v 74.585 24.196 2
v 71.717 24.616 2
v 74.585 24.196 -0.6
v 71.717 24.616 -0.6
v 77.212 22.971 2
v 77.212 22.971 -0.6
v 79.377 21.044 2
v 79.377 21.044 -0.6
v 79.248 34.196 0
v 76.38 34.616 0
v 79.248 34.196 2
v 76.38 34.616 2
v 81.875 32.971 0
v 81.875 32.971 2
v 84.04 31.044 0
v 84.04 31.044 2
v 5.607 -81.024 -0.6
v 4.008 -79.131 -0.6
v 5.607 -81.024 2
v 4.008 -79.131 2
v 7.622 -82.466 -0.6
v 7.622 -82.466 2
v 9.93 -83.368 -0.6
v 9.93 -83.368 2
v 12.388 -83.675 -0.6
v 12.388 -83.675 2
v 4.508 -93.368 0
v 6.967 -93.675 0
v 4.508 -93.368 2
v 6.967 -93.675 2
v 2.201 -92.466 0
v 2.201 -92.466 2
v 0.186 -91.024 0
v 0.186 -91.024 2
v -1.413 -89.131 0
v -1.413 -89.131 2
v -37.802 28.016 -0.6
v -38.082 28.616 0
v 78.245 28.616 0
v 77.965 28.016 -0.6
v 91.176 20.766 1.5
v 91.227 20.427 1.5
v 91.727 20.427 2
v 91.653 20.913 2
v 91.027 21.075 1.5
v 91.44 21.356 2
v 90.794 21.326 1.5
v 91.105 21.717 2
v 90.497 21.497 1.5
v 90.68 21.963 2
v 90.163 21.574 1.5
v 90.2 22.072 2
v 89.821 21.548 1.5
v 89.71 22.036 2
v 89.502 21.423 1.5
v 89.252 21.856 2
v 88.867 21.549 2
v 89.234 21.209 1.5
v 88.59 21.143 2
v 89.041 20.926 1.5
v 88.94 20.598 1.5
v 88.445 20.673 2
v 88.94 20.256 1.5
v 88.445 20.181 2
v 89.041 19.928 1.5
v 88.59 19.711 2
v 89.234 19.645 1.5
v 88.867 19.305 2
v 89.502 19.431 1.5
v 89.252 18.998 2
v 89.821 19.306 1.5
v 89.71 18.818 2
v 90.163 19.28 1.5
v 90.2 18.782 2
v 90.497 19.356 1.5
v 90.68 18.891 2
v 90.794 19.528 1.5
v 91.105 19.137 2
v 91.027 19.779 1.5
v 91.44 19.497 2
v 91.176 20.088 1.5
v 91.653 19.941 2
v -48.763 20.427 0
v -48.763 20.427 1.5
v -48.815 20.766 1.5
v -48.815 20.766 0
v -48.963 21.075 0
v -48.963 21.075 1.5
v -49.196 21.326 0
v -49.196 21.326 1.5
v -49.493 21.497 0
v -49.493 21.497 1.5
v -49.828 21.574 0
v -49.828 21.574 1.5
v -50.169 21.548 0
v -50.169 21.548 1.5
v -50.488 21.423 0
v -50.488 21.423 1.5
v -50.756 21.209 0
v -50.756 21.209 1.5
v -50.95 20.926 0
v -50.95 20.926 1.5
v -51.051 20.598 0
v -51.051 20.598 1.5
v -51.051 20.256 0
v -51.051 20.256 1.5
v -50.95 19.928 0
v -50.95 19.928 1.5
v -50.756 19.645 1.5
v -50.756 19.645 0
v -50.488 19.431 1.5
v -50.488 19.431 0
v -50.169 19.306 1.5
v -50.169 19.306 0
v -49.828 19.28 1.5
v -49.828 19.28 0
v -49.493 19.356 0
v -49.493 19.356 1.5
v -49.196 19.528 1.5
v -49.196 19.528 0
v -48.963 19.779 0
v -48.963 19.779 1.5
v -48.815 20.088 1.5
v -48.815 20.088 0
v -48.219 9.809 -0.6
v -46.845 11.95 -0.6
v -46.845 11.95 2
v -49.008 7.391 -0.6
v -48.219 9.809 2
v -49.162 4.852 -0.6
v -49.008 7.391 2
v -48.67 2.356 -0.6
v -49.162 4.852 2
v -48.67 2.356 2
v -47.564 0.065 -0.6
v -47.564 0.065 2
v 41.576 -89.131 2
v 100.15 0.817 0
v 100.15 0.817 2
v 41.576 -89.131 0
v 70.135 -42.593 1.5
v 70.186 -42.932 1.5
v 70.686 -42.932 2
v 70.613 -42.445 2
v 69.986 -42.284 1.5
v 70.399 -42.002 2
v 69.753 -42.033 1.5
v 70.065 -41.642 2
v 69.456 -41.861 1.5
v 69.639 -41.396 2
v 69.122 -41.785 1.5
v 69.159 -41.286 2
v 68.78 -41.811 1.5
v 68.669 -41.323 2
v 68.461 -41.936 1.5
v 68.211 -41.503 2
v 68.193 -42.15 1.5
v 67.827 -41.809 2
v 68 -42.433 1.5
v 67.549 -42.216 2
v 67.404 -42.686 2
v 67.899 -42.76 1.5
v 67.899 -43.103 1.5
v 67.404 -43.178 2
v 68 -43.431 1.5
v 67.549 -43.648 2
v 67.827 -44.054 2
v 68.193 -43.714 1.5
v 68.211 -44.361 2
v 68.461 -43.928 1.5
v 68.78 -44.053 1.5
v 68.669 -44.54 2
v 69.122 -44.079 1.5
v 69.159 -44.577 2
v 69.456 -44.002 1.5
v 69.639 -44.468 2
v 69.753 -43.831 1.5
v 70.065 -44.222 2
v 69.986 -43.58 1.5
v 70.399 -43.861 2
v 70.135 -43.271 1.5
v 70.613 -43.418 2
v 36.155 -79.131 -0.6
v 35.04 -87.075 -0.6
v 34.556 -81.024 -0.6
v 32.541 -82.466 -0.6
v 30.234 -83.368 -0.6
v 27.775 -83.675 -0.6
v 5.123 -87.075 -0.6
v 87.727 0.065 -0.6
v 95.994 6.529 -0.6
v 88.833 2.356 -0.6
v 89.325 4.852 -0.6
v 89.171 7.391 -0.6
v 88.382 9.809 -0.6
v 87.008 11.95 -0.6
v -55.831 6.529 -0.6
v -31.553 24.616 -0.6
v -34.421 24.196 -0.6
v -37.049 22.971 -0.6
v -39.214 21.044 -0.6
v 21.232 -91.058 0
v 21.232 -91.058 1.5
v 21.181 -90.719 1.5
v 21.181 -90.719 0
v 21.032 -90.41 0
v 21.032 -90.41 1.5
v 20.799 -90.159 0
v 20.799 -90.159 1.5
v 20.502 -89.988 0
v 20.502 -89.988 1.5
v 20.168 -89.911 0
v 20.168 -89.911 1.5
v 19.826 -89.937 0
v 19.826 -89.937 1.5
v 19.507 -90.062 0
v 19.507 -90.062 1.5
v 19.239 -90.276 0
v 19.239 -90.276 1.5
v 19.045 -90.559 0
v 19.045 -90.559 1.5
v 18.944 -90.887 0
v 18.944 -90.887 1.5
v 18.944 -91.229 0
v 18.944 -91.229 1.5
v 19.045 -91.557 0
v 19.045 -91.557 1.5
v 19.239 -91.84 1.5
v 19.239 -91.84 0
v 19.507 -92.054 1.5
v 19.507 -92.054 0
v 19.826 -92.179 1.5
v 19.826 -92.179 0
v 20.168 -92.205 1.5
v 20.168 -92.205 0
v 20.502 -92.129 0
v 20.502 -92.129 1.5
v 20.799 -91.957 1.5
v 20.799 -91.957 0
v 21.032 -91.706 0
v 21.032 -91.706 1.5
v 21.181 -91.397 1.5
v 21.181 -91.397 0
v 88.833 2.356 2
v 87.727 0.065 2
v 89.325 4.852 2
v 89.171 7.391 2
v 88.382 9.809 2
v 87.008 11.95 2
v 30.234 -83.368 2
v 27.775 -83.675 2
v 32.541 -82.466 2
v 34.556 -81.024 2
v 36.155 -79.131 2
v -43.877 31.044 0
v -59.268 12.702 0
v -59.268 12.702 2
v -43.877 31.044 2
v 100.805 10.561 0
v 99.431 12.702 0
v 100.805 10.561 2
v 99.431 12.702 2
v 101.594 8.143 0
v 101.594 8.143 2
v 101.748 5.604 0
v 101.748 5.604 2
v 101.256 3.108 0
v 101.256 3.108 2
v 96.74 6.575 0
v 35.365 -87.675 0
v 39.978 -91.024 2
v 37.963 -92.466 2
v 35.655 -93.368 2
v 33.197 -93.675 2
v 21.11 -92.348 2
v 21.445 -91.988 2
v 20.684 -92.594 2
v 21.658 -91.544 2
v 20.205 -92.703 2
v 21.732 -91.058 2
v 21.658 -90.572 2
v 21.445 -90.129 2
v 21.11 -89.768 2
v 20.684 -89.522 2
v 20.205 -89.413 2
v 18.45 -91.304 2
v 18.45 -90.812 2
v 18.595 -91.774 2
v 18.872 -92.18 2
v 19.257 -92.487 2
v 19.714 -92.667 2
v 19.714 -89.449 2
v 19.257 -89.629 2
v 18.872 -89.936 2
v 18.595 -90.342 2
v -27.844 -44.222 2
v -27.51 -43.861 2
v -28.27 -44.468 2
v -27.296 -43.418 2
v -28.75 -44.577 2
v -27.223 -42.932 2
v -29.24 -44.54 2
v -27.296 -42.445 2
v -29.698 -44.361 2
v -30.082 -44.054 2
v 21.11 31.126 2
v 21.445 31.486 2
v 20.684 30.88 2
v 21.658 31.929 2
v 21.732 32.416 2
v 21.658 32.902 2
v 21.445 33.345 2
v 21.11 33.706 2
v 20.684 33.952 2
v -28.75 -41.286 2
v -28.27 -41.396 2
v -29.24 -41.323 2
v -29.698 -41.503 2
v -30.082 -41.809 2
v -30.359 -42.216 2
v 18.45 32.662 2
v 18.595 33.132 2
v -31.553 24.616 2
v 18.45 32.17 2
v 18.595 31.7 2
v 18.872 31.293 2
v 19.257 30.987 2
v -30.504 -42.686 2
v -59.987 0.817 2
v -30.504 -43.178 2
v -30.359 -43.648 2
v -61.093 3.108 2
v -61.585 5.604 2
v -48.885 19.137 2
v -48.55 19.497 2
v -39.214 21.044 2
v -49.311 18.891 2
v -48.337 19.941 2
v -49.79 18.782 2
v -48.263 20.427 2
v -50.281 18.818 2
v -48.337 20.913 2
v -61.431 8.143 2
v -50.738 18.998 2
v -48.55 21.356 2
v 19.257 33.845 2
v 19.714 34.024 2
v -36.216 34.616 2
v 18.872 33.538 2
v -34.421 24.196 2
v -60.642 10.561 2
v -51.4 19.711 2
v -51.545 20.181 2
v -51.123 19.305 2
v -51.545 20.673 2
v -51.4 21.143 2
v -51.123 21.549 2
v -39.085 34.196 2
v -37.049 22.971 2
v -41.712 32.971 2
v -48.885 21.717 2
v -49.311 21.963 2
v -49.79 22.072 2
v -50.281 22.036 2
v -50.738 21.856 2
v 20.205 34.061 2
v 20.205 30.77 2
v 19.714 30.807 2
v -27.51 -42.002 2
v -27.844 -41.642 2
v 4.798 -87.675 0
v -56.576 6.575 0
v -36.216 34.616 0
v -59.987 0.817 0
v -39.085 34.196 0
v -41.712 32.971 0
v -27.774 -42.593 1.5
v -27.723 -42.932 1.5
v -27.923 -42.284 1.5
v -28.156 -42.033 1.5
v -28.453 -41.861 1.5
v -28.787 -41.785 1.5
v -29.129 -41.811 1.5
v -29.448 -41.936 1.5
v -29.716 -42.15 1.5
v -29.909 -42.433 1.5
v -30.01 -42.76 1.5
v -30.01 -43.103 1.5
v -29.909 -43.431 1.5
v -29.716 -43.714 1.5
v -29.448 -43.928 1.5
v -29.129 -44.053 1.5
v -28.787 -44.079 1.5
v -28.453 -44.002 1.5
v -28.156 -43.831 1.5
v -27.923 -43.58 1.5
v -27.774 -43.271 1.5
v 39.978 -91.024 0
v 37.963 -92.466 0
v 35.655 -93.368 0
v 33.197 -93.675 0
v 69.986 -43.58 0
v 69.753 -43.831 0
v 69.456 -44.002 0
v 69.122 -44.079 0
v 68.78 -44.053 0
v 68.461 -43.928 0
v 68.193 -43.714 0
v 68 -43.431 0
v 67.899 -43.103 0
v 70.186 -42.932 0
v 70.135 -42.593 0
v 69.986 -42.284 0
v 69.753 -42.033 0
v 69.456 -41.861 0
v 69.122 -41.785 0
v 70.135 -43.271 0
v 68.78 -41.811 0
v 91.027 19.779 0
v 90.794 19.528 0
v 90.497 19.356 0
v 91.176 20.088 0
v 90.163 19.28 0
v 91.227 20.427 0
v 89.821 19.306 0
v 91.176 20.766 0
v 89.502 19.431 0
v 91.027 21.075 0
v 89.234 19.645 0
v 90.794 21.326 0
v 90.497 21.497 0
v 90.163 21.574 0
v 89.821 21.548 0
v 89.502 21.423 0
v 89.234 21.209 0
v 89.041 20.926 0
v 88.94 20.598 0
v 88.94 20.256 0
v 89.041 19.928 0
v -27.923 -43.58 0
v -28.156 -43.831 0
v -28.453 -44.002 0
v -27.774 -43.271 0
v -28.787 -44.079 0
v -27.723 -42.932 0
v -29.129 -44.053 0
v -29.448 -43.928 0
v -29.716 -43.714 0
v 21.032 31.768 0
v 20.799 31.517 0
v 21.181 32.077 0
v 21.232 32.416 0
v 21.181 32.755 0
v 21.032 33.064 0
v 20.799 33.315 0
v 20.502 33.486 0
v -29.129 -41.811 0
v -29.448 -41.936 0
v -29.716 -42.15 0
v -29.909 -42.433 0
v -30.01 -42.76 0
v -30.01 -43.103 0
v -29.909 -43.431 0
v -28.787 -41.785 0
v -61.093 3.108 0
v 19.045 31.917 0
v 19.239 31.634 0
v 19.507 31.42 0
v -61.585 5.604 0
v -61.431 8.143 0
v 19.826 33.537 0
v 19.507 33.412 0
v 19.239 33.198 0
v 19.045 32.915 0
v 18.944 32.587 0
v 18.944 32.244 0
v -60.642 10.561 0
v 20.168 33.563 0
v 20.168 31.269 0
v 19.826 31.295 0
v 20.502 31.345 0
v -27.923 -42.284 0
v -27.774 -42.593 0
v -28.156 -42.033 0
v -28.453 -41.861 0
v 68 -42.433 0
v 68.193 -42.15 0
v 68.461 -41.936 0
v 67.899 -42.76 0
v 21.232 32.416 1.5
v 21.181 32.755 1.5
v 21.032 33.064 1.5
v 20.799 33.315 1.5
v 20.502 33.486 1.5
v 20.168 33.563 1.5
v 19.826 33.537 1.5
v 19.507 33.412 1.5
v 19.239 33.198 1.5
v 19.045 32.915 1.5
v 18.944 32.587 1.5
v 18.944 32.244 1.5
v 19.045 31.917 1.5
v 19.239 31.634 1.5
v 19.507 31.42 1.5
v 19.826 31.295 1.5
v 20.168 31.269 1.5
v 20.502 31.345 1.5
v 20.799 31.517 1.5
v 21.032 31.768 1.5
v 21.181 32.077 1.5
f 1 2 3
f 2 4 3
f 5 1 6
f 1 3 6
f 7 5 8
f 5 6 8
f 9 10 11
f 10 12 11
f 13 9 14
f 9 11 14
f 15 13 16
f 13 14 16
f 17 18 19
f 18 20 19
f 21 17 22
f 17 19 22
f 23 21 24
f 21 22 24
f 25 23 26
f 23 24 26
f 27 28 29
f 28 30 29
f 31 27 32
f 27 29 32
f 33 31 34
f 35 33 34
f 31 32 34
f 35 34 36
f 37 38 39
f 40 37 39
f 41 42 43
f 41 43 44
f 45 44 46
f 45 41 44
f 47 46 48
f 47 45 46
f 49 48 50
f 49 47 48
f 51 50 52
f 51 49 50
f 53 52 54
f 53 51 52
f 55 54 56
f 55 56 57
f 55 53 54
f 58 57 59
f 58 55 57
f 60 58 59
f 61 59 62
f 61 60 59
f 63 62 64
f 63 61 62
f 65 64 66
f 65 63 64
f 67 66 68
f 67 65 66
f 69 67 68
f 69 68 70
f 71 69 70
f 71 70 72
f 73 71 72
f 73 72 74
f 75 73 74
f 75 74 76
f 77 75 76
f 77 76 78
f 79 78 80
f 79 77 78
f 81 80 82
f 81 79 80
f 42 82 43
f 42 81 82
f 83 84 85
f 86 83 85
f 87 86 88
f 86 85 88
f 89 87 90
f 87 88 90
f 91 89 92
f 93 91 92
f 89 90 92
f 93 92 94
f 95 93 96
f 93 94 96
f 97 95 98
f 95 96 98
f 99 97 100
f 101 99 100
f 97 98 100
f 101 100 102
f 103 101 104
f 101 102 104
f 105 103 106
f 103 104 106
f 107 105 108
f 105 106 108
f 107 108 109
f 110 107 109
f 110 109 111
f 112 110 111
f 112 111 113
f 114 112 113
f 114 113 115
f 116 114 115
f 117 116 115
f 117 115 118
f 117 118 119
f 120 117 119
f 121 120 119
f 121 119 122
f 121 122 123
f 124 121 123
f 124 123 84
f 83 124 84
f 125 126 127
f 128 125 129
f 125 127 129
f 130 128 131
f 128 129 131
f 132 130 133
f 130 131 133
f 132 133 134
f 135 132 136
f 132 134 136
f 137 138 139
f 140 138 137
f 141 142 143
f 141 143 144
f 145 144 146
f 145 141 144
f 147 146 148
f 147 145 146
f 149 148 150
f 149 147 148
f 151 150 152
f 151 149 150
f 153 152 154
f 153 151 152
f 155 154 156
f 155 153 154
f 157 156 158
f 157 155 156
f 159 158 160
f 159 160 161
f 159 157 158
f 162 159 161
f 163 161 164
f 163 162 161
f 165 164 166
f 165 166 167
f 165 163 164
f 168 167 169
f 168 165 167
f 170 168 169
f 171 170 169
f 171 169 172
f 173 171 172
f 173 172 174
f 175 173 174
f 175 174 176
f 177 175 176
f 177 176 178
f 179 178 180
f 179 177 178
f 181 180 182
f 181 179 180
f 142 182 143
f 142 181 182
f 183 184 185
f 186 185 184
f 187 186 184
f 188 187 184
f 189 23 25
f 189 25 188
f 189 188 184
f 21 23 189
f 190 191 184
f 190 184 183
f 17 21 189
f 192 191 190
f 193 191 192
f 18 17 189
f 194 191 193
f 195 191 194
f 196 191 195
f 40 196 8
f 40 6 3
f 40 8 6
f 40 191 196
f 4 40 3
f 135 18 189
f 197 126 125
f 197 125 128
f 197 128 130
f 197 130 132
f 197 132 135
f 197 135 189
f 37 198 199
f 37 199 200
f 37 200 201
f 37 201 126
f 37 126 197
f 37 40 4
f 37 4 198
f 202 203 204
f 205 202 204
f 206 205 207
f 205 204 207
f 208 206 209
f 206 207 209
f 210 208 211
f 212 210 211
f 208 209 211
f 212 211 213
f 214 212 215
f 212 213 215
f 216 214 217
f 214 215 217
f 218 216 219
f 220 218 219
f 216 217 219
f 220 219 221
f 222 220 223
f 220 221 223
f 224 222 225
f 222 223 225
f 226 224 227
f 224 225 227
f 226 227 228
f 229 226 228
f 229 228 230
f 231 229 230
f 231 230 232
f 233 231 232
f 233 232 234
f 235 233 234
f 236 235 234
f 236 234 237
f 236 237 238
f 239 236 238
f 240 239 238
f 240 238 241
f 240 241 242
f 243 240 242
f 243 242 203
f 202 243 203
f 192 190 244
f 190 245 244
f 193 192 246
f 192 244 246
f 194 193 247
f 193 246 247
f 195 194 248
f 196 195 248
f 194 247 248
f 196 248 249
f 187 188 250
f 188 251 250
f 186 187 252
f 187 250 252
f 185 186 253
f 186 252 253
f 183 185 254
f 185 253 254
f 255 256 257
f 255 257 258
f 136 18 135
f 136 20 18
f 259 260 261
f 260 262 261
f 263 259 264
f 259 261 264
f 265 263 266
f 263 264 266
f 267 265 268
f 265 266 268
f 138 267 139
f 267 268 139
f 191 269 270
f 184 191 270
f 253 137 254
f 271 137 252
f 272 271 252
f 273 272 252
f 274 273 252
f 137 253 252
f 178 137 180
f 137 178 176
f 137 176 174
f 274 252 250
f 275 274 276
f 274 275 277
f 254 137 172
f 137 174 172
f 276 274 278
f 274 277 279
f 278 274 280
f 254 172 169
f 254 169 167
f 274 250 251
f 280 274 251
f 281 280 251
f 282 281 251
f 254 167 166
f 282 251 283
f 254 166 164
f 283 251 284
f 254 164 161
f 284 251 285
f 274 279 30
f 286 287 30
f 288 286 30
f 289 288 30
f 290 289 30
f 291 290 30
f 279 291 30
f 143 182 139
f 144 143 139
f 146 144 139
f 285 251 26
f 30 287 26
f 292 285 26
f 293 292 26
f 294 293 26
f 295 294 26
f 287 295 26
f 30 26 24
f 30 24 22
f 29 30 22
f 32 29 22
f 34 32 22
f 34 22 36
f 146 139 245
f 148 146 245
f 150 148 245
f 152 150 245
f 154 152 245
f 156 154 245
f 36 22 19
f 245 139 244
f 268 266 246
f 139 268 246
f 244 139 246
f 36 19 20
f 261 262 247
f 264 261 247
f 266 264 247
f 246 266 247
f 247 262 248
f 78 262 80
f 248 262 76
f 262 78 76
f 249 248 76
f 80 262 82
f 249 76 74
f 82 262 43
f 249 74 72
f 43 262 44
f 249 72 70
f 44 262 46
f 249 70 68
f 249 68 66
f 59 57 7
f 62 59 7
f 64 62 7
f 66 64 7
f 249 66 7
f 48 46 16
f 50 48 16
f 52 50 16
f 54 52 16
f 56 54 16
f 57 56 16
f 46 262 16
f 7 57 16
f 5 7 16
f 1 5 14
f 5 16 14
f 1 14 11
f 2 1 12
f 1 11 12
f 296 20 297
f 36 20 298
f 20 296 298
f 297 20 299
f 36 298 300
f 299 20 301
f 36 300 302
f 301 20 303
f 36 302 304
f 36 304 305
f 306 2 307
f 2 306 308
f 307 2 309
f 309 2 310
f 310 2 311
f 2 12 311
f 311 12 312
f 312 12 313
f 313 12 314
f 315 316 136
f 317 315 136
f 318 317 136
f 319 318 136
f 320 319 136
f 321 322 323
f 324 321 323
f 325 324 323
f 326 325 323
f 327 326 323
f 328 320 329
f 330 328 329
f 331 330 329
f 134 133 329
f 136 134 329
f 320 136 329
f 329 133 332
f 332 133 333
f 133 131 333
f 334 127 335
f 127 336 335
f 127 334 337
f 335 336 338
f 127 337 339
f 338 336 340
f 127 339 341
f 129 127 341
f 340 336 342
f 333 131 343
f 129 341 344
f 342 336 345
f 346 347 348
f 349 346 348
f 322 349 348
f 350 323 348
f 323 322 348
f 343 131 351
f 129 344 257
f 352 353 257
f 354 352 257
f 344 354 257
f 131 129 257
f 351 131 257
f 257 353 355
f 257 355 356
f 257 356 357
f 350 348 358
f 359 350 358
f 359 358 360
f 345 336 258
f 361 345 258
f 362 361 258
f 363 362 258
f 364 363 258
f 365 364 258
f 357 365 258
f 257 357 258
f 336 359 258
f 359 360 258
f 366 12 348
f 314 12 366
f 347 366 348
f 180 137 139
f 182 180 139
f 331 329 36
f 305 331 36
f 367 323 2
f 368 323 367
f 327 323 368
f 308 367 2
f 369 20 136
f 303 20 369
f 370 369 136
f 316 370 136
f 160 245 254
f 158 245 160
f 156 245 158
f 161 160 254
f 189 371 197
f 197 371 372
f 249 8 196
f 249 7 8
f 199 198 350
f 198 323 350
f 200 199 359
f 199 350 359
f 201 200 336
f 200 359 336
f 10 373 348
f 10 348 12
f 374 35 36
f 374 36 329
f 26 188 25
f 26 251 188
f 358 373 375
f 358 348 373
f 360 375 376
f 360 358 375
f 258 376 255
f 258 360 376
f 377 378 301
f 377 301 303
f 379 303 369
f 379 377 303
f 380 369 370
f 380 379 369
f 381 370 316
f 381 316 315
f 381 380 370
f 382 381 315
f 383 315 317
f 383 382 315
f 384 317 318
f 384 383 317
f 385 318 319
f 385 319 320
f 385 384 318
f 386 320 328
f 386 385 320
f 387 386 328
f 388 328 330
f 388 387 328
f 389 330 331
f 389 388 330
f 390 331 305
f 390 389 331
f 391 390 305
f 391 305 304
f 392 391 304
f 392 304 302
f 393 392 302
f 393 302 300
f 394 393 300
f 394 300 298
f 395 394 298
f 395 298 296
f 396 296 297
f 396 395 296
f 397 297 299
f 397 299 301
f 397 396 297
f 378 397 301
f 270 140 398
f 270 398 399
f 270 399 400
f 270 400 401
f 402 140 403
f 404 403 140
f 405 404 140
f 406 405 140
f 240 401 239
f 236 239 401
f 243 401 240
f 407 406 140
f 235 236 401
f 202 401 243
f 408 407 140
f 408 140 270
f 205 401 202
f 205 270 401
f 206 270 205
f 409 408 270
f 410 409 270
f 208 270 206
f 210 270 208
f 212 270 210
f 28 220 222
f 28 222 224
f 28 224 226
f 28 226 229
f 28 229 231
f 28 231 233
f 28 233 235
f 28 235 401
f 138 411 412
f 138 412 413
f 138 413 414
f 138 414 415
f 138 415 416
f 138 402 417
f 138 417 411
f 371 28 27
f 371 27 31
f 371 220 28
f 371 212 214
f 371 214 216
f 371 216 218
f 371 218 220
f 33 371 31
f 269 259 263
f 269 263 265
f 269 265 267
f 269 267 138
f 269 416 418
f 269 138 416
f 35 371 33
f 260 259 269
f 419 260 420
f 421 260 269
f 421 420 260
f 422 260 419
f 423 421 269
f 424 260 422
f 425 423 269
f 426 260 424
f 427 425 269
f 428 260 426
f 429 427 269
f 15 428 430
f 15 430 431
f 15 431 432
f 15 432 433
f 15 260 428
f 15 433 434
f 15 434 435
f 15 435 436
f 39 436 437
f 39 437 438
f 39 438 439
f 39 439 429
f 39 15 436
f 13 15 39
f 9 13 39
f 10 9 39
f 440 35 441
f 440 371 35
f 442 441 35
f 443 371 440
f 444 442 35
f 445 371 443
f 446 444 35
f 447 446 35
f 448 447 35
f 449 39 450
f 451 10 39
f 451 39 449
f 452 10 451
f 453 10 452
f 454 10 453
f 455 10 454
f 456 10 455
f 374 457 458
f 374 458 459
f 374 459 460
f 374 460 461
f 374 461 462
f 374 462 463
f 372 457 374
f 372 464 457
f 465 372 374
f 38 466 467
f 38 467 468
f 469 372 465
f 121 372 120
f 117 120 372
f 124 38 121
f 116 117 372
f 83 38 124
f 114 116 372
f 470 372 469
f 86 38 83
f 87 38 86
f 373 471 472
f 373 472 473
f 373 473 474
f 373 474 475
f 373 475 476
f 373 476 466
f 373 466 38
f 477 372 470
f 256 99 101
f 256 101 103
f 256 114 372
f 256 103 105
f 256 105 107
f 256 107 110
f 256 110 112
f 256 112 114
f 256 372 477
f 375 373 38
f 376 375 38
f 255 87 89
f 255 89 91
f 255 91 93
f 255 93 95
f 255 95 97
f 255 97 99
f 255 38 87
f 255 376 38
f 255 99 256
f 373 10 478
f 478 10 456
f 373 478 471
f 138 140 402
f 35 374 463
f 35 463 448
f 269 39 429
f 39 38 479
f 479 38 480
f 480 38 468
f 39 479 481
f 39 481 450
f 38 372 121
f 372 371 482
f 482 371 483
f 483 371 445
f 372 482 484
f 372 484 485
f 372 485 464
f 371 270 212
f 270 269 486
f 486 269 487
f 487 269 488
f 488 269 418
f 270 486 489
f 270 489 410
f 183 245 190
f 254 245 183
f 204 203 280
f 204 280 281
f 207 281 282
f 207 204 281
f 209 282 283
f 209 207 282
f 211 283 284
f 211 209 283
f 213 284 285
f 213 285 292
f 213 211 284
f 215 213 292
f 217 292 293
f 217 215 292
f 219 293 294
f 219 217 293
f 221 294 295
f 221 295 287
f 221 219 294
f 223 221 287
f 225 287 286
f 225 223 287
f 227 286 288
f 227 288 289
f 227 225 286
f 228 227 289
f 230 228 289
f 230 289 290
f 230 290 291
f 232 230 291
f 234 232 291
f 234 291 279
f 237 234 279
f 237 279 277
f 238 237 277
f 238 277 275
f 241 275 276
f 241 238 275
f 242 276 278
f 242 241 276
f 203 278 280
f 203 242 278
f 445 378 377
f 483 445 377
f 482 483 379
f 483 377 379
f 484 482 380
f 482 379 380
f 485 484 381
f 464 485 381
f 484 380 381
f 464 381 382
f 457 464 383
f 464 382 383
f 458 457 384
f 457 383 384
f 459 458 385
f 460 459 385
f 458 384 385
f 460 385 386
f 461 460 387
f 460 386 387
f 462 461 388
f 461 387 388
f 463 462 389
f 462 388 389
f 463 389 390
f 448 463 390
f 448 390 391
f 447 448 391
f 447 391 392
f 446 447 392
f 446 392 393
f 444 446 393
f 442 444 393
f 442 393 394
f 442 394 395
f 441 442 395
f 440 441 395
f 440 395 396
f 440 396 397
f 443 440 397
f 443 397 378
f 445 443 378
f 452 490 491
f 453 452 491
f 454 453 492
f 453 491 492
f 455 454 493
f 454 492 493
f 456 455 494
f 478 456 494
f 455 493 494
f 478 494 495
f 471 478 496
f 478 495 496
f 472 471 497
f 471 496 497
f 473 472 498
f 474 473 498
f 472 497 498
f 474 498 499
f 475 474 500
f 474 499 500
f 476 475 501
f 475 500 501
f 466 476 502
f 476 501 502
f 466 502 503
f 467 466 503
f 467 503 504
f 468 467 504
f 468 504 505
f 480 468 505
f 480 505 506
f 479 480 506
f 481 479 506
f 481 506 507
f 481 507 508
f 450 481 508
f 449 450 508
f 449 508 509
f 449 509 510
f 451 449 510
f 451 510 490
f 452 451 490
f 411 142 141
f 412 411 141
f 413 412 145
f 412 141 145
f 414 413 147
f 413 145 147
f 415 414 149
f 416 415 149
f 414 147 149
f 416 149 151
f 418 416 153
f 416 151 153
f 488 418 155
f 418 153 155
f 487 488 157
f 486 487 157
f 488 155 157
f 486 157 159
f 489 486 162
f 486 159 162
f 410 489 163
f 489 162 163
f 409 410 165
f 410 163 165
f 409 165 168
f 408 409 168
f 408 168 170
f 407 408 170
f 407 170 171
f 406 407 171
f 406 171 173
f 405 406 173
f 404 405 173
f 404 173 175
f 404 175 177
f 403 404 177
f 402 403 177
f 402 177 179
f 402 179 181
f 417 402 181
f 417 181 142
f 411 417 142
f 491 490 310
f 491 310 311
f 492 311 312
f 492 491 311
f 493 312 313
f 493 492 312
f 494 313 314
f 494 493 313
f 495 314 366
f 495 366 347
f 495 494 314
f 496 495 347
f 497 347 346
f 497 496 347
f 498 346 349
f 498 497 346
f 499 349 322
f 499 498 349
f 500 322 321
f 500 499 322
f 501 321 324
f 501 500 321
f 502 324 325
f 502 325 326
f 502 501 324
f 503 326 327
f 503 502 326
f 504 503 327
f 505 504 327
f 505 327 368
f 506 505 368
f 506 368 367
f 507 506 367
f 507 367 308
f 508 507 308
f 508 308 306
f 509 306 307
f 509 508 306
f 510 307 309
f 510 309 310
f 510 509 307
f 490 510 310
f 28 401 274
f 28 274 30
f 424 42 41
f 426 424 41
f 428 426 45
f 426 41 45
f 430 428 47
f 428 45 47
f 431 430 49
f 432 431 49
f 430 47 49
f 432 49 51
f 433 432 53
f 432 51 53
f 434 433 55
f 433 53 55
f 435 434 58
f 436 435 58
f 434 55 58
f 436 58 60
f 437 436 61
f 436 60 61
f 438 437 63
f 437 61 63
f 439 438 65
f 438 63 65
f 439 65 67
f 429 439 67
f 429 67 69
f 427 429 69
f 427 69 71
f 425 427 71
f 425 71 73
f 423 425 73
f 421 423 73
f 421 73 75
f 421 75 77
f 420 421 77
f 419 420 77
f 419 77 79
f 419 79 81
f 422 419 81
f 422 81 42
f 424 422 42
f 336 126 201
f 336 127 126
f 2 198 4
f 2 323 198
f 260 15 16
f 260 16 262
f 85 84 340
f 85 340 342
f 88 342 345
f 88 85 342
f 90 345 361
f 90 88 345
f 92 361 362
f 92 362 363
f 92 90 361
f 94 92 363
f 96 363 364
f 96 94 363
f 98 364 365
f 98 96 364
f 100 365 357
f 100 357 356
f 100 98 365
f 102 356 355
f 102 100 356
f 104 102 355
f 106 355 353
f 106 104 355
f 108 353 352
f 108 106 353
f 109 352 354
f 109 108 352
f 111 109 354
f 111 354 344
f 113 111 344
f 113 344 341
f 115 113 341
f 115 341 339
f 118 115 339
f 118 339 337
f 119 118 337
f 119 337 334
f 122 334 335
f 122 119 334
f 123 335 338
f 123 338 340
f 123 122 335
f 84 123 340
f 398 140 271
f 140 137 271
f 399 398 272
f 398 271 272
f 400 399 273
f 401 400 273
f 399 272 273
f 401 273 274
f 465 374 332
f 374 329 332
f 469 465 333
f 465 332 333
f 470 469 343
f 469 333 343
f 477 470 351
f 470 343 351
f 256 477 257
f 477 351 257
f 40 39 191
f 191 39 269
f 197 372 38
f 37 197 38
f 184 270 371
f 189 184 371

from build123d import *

# Parameters (mm, degrees)
BOSS_EXTRU_1_DEPTH      = 2
CONG_1_R                = 10
ENL_V_MAT_EXTRU_1_DEPTH = 2
BOSS_EXTRU_2_DEPTH      = 0.6
CONG_2_R                = 10
ESQUISSE3_R             = 1.15
ENL_V_MAT_EXTRU_2_DEPTH = 10
CHANFREIN1_SIZE         = 0.5
CHANFREIN3_SIZE         = 0.6


with BuildPart() as part:
    # Esquisse1 → Boss.-Extru.1 (new body)
    with BuildSketch(Plane.XY):
        Polygon((-40.879571388, 34.615718895), (81.042798068, 34.615718895), (104.193503713, 7.025782272), (38.617977526, -93.674532757), (1.545249154, -93.674532757), (-64.030277033, 7.025782272), align=None)
    extrude(amount=BOSS_EXTRU_1_DEPTH)

    # Congé1
    cong_1_edges = [part.edges().sort_by_distance(p)[0] for p in [
        (-40.879571388, 34.615718895, 1),
        (81.042798068, 34.615718895, 1),
        (104.193503713, 7.025782272, 1),
        (38.617977526, -93.674532757, 1),
        (1.545249154, -93.674532757, 1),
        (-64.030277033, 7.025782272, 1),
    ]]
    fillet(cong_1_edges, radius=CONG_1_R)

    # Esquisse2 → Enlèv. mat.-Extru.1 (cut)
    with BuildSketch(Plane.XY.offset(2)):
        Polygon((-36.216494806, 24.615718895), (-51.607204261, 6.27378561), (6.96667711, -83.674532757), (33.19654957, -83.674532757), (91.770430941, 6.27378561), (76.379721487, 24.615718895), align=None)
    extrude(amount=-ENL_V_MAT_EXTRU_1_DEPTH, mode=Mode.SUBTRACT)

    # Esquisse4 → Boss.-Extru.2 (add)
    with BuildSketch(Plane(origin=(0, 0, 0), x_dir=(-1, 0, 0), z_dir=(0, 0, -1))):
        Polygon((-78.244952119, 28.615718895), (-96.73966005, 6.574584275), (-35.365120753, -87.674532757), (-4.798105928, -87.674532757), (56.57643337, 6.574584275), (38.081725439, 28.615718895), align=None)
        Polygon((-76.379721487, 24.615718895), (-91.770430941, 6.27378561), (-33.19654957, -83.674532757), (-6.96667711, -83.674532757), (51.607204261, 6.27378561), (36.216494806, 24.615718895), align=None, mode=Mode.SUBTRACT)
    extrude(amount=BOSS_EXTRU_2_DEPTH)

    # Congé2
    cong_2_edges = [part.edges().sort_by_distance(p)[0] for p in [
        (-36.216494806, 24.615718895, 0.7),
        (76.379721487, 24.615718895, 0.7),
        (91.770430941, 6.27378561, 0.7),
        (33.19654957, -83.674532757, 0.7),
        (6.96667711, -83.674532757, 0.7),
        (-51.607204261, 6.27378561, 0.7),
    ]]
    fillet(cong_2_edges, radius=CONG_2_R)

    # Esquisse3 → Enlèv. mat.-Extru.2 (cut)
    with BuildSketch(Plane.XY.offset(2)):
        with Locations((20.08161334, -91.058073416)):
            Circle(ESQUISSE3_R)
        with Locations((-28.872824595, -42.931783887)):
            Circle(ESQUISSE3_R)
        with Locations((20.08161334, 32.415718895)):
            Circle(ESQUISSE3_R)
        with Locations((90.076701777, 20.426939275)):
            Circle(ESQUISSE3_R)
        with Locations((69.036051275, -42.931783887)):
            Circle(ESQUISSE3_R)
        with Locations((-49.913475097, 20.426939275)):
            Circle(ESQUISSE3_R)
    extrude(amount=-ENL_V_MAT_EXTRU_2_DEPTH, mode=Mode.SUBTRACT)

    # Chanfrein1
    chanfrein1_edges = [part.edges().sort_by_distance(p)[0] for p in [
        (-51.063475097, 20.426939275, 2),
        (67.886051275, -42.931783887, 2),
        (88.926701777, 20.426939275, 2),
        (18.93161334, 32.415718895, 2),
        (-30.022824595, -42.931783887, 2),
        (18.93161334, -91.058073416, 2),
    ]]
    chamfer(chanfrein1_edges, length=CHANFREIN1_SIZE)

    # Chanfrein3
    chanfrein3_edges = [part.edges().sort_by_distance(p)[0] for p in [
        (87.492306084, 17.595151585, -0.6),
        (20.08161334, 28.615718895, -0.6),
        (-47.329079404, 17.595151585, -0.6),
        (-25.889163721, -40.549974241, -0.6),
        (20.08161334, -87.674532757, -0.6),
        (66.052390401, -40.549974241, -0.6),
    ]]
    chamfer(chanfrein3_edges, length=CHANFREIN3_SIZE - 0.0001)  # a hair under: the kernel refuses the full size


solid = part.part
